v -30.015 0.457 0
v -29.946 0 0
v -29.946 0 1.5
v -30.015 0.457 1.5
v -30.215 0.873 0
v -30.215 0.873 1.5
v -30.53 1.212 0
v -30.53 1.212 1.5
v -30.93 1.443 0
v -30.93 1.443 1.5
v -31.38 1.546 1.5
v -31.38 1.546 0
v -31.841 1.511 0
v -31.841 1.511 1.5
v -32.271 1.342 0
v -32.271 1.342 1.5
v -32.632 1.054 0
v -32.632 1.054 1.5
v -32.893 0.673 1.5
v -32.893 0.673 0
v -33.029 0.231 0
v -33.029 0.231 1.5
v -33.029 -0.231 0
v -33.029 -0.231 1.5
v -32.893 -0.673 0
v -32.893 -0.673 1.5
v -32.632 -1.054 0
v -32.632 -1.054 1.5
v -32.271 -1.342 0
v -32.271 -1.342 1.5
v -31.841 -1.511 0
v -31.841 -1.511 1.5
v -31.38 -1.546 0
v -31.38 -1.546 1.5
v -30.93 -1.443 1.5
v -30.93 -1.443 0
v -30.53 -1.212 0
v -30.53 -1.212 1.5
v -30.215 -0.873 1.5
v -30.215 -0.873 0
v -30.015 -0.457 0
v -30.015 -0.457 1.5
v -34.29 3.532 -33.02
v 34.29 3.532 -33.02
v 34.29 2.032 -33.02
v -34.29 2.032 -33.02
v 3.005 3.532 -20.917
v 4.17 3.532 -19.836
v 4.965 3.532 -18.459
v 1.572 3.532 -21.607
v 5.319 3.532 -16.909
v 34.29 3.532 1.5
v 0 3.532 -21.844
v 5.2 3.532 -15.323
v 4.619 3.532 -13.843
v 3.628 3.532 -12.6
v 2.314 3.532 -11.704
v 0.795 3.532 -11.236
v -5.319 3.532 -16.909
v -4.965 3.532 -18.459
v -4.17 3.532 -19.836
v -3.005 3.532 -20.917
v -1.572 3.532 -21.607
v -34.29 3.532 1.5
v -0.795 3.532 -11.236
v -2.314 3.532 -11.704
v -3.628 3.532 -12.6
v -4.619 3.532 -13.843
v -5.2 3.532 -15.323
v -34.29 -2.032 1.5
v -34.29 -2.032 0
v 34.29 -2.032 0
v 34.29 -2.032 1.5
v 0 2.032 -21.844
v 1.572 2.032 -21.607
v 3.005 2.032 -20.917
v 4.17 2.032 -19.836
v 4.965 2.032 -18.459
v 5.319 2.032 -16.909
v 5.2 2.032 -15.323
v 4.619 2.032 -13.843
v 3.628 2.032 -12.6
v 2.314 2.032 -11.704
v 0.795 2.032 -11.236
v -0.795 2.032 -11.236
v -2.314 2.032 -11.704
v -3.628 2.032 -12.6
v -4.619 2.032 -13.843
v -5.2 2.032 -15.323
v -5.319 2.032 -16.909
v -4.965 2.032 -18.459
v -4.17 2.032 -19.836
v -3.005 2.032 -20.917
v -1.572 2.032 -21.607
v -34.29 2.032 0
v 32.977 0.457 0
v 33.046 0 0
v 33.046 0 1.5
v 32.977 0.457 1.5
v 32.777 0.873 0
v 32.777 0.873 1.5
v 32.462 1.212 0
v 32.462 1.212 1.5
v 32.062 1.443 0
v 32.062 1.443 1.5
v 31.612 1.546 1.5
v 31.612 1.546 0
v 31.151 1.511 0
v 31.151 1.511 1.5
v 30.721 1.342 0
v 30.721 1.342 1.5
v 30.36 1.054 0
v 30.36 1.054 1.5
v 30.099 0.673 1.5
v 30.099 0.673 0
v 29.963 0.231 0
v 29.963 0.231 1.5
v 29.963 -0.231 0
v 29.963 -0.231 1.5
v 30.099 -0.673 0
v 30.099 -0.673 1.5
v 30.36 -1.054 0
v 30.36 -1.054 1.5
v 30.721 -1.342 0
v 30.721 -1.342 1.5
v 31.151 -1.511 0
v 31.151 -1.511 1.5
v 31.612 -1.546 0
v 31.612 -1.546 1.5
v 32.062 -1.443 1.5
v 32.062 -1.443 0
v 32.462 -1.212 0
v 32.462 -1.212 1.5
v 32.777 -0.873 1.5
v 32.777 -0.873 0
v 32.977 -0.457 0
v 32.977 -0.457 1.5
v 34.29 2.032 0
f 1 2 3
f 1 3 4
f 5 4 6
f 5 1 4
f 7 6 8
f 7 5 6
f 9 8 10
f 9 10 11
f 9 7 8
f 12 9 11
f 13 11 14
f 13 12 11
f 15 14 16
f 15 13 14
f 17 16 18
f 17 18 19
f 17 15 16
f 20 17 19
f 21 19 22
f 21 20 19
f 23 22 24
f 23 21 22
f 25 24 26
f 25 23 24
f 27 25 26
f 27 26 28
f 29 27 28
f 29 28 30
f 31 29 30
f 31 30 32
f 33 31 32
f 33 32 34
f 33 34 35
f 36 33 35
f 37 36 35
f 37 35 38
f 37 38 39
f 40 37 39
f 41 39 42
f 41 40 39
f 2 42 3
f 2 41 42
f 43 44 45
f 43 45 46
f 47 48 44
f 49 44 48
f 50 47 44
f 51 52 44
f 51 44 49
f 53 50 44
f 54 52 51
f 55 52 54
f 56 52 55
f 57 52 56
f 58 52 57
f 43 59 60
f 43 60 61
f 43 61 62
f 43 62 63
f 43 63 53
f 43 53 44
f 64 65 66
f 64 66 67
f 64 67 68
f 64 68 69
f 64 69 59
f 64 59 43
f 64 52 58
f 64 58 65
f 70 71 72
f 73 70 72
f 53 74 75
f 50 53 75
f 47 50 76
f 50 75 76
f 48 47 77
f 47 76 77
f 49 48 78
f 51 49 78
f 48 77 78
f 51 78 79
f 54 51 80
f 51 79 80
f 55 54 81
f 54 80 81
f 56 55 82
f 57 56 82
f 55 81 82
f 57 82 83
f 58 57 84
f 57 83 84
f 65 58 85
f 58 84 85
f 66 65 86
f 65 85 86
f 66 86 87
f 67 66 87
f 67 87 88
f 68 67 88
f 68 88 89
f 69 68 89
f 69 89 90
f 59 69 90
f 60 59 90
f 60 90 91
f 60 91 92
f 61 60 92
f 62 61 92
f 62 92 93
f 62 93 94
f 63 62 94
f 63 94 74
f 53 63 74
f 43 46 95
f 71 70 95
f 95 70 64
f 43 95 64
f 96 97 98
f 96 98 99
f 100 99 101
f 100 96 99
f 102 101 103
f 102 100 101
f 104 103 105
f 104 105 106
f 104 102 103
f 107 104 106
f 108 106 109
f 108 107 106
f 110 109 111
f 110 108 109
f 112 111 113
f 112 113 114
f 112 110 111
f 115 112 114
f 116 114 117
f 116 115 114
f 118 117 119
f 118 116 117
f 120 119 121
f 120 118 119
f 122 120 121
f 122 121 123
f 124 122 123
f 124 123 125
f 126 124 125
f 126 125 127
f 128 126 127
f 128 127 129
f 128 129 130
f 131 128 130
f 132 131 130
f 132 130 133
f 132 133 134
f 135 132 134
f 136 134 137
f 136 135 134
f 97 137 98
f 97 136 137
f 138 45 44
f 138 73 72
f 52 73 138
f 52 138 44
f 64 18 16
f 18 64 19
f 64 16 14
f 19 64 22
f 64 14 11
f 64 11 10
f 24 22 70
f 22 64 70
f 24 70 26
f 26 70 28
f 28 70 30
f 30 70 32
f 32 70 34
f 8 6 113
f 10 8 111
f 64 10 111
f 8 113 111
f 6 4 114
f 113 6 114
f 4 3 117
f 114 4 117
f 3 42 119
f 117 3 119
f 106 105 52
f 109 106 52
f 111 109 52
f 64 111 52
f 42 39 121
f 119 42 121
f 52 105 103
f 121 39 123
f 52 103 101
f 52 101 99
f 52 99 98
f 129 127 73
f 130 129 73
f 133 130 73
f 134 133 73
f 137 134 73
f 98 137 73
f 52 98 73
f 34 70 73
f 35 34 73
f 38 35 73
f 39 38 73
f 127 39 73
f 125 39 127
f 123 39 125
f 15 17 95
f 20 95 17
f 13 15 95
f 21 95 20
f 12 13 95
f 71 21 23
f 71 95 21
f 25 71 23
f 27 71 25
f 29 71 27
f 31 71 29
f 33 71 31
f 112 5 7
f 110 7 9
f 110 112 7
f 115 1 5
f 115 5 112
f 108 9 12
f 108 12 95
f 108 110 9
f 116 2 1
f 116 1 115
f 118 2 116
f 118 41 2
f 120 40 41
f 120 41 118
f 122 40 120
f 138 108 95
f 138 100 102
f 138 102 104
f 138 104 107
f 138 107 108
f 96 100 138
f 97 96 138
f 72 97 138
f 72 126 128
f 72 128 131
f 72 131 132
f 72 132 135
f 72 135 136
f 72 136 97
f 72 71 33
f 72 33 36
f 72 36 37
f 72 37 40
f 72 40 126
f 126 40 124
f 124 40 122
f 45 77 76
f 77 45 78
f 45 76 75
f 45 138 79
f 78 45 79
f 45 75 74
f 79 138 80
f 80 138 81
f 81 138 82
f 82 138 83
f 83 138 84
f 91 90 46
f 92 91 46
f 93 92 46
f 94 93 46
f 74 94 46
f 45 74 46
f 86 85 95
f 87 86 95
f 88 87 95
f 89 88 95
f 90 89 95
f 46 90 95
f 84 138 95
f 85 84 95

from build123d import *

# Parameters (mm, degrees)
SKETCH_1_W          = 68.58
SKETCH_1_H          = 4.064
SKETCH_1_R          = 1.55
EXTRUDE_2_DEPTH     = 1.5
SKETCH_3_W          = 68.58
SKETCH_3_H          = 1.5
EXTRUDE_3_DEPTH     = 1.5
SKETCH_4_W          = 68.58
SKETCH_4_H          = 1.5
EXTRUDE_4_DEPTH     = 33.02
SKETCH_5_R          = 5.334
CUT_EXTRUDE_2_DEPTH = 33.02


with BuildPart() as part:
    # 草图1 → 凸台-拉伸2 (new body)
    with BuildSketch(Plane.XY):
        Rectangle(SKETCH_1_W, SKETCH_1_H)
        with Locations((31.496, 0)):
            Circle(SKETCH_1_R, mode=Mode.SUBTRACT)
        with Locations((-31.496, 0)):
            Circle(SKETCH_1_R, mode=Mode.SUBTRACT)
    extrude(amount=EXTRUDE_2_DEPTH)

    # 草图3 → 凸台-拉伸3 (add)
    with BuildSketch(Plane(origin=(0, 2.032, 0), x_dir=(1, 0, 0), z_dir=(0, 1, 0))):
        with Locations((0, -0.75)):
            Rectangle(SKETCH_3_W, SKETCH_3_H)
    extrude(amount=EXTRUDE_3_DEPTH)

    # 草图4 → 凸台-拉伸4 (add)
    with BuildSketch(Plane(origin=(0, 0, 0), x_dir=(-1, 0, 0), z_dir=(0, 0, -1))):
        with Locations((0, 2.782)):
            Rectangle(SKETCH_4_W, SKETCH_4_H)
    extrude(amount=EXTRUDE_4_DEPTH)

    # 草图5 → 切除-拉伸2 (cut)
    with BuildSketch(Plane.XZ.offset(-2.032)):
        with Locations(Location((0, -16.51, 0), (0, 0, 270))):
            Circle(SKETCH_5_R)
    extrude(amount=-CUT_EXTRUDE_2_DEPTH, mode=Mode.SUBTRACT)


solid = part.part
